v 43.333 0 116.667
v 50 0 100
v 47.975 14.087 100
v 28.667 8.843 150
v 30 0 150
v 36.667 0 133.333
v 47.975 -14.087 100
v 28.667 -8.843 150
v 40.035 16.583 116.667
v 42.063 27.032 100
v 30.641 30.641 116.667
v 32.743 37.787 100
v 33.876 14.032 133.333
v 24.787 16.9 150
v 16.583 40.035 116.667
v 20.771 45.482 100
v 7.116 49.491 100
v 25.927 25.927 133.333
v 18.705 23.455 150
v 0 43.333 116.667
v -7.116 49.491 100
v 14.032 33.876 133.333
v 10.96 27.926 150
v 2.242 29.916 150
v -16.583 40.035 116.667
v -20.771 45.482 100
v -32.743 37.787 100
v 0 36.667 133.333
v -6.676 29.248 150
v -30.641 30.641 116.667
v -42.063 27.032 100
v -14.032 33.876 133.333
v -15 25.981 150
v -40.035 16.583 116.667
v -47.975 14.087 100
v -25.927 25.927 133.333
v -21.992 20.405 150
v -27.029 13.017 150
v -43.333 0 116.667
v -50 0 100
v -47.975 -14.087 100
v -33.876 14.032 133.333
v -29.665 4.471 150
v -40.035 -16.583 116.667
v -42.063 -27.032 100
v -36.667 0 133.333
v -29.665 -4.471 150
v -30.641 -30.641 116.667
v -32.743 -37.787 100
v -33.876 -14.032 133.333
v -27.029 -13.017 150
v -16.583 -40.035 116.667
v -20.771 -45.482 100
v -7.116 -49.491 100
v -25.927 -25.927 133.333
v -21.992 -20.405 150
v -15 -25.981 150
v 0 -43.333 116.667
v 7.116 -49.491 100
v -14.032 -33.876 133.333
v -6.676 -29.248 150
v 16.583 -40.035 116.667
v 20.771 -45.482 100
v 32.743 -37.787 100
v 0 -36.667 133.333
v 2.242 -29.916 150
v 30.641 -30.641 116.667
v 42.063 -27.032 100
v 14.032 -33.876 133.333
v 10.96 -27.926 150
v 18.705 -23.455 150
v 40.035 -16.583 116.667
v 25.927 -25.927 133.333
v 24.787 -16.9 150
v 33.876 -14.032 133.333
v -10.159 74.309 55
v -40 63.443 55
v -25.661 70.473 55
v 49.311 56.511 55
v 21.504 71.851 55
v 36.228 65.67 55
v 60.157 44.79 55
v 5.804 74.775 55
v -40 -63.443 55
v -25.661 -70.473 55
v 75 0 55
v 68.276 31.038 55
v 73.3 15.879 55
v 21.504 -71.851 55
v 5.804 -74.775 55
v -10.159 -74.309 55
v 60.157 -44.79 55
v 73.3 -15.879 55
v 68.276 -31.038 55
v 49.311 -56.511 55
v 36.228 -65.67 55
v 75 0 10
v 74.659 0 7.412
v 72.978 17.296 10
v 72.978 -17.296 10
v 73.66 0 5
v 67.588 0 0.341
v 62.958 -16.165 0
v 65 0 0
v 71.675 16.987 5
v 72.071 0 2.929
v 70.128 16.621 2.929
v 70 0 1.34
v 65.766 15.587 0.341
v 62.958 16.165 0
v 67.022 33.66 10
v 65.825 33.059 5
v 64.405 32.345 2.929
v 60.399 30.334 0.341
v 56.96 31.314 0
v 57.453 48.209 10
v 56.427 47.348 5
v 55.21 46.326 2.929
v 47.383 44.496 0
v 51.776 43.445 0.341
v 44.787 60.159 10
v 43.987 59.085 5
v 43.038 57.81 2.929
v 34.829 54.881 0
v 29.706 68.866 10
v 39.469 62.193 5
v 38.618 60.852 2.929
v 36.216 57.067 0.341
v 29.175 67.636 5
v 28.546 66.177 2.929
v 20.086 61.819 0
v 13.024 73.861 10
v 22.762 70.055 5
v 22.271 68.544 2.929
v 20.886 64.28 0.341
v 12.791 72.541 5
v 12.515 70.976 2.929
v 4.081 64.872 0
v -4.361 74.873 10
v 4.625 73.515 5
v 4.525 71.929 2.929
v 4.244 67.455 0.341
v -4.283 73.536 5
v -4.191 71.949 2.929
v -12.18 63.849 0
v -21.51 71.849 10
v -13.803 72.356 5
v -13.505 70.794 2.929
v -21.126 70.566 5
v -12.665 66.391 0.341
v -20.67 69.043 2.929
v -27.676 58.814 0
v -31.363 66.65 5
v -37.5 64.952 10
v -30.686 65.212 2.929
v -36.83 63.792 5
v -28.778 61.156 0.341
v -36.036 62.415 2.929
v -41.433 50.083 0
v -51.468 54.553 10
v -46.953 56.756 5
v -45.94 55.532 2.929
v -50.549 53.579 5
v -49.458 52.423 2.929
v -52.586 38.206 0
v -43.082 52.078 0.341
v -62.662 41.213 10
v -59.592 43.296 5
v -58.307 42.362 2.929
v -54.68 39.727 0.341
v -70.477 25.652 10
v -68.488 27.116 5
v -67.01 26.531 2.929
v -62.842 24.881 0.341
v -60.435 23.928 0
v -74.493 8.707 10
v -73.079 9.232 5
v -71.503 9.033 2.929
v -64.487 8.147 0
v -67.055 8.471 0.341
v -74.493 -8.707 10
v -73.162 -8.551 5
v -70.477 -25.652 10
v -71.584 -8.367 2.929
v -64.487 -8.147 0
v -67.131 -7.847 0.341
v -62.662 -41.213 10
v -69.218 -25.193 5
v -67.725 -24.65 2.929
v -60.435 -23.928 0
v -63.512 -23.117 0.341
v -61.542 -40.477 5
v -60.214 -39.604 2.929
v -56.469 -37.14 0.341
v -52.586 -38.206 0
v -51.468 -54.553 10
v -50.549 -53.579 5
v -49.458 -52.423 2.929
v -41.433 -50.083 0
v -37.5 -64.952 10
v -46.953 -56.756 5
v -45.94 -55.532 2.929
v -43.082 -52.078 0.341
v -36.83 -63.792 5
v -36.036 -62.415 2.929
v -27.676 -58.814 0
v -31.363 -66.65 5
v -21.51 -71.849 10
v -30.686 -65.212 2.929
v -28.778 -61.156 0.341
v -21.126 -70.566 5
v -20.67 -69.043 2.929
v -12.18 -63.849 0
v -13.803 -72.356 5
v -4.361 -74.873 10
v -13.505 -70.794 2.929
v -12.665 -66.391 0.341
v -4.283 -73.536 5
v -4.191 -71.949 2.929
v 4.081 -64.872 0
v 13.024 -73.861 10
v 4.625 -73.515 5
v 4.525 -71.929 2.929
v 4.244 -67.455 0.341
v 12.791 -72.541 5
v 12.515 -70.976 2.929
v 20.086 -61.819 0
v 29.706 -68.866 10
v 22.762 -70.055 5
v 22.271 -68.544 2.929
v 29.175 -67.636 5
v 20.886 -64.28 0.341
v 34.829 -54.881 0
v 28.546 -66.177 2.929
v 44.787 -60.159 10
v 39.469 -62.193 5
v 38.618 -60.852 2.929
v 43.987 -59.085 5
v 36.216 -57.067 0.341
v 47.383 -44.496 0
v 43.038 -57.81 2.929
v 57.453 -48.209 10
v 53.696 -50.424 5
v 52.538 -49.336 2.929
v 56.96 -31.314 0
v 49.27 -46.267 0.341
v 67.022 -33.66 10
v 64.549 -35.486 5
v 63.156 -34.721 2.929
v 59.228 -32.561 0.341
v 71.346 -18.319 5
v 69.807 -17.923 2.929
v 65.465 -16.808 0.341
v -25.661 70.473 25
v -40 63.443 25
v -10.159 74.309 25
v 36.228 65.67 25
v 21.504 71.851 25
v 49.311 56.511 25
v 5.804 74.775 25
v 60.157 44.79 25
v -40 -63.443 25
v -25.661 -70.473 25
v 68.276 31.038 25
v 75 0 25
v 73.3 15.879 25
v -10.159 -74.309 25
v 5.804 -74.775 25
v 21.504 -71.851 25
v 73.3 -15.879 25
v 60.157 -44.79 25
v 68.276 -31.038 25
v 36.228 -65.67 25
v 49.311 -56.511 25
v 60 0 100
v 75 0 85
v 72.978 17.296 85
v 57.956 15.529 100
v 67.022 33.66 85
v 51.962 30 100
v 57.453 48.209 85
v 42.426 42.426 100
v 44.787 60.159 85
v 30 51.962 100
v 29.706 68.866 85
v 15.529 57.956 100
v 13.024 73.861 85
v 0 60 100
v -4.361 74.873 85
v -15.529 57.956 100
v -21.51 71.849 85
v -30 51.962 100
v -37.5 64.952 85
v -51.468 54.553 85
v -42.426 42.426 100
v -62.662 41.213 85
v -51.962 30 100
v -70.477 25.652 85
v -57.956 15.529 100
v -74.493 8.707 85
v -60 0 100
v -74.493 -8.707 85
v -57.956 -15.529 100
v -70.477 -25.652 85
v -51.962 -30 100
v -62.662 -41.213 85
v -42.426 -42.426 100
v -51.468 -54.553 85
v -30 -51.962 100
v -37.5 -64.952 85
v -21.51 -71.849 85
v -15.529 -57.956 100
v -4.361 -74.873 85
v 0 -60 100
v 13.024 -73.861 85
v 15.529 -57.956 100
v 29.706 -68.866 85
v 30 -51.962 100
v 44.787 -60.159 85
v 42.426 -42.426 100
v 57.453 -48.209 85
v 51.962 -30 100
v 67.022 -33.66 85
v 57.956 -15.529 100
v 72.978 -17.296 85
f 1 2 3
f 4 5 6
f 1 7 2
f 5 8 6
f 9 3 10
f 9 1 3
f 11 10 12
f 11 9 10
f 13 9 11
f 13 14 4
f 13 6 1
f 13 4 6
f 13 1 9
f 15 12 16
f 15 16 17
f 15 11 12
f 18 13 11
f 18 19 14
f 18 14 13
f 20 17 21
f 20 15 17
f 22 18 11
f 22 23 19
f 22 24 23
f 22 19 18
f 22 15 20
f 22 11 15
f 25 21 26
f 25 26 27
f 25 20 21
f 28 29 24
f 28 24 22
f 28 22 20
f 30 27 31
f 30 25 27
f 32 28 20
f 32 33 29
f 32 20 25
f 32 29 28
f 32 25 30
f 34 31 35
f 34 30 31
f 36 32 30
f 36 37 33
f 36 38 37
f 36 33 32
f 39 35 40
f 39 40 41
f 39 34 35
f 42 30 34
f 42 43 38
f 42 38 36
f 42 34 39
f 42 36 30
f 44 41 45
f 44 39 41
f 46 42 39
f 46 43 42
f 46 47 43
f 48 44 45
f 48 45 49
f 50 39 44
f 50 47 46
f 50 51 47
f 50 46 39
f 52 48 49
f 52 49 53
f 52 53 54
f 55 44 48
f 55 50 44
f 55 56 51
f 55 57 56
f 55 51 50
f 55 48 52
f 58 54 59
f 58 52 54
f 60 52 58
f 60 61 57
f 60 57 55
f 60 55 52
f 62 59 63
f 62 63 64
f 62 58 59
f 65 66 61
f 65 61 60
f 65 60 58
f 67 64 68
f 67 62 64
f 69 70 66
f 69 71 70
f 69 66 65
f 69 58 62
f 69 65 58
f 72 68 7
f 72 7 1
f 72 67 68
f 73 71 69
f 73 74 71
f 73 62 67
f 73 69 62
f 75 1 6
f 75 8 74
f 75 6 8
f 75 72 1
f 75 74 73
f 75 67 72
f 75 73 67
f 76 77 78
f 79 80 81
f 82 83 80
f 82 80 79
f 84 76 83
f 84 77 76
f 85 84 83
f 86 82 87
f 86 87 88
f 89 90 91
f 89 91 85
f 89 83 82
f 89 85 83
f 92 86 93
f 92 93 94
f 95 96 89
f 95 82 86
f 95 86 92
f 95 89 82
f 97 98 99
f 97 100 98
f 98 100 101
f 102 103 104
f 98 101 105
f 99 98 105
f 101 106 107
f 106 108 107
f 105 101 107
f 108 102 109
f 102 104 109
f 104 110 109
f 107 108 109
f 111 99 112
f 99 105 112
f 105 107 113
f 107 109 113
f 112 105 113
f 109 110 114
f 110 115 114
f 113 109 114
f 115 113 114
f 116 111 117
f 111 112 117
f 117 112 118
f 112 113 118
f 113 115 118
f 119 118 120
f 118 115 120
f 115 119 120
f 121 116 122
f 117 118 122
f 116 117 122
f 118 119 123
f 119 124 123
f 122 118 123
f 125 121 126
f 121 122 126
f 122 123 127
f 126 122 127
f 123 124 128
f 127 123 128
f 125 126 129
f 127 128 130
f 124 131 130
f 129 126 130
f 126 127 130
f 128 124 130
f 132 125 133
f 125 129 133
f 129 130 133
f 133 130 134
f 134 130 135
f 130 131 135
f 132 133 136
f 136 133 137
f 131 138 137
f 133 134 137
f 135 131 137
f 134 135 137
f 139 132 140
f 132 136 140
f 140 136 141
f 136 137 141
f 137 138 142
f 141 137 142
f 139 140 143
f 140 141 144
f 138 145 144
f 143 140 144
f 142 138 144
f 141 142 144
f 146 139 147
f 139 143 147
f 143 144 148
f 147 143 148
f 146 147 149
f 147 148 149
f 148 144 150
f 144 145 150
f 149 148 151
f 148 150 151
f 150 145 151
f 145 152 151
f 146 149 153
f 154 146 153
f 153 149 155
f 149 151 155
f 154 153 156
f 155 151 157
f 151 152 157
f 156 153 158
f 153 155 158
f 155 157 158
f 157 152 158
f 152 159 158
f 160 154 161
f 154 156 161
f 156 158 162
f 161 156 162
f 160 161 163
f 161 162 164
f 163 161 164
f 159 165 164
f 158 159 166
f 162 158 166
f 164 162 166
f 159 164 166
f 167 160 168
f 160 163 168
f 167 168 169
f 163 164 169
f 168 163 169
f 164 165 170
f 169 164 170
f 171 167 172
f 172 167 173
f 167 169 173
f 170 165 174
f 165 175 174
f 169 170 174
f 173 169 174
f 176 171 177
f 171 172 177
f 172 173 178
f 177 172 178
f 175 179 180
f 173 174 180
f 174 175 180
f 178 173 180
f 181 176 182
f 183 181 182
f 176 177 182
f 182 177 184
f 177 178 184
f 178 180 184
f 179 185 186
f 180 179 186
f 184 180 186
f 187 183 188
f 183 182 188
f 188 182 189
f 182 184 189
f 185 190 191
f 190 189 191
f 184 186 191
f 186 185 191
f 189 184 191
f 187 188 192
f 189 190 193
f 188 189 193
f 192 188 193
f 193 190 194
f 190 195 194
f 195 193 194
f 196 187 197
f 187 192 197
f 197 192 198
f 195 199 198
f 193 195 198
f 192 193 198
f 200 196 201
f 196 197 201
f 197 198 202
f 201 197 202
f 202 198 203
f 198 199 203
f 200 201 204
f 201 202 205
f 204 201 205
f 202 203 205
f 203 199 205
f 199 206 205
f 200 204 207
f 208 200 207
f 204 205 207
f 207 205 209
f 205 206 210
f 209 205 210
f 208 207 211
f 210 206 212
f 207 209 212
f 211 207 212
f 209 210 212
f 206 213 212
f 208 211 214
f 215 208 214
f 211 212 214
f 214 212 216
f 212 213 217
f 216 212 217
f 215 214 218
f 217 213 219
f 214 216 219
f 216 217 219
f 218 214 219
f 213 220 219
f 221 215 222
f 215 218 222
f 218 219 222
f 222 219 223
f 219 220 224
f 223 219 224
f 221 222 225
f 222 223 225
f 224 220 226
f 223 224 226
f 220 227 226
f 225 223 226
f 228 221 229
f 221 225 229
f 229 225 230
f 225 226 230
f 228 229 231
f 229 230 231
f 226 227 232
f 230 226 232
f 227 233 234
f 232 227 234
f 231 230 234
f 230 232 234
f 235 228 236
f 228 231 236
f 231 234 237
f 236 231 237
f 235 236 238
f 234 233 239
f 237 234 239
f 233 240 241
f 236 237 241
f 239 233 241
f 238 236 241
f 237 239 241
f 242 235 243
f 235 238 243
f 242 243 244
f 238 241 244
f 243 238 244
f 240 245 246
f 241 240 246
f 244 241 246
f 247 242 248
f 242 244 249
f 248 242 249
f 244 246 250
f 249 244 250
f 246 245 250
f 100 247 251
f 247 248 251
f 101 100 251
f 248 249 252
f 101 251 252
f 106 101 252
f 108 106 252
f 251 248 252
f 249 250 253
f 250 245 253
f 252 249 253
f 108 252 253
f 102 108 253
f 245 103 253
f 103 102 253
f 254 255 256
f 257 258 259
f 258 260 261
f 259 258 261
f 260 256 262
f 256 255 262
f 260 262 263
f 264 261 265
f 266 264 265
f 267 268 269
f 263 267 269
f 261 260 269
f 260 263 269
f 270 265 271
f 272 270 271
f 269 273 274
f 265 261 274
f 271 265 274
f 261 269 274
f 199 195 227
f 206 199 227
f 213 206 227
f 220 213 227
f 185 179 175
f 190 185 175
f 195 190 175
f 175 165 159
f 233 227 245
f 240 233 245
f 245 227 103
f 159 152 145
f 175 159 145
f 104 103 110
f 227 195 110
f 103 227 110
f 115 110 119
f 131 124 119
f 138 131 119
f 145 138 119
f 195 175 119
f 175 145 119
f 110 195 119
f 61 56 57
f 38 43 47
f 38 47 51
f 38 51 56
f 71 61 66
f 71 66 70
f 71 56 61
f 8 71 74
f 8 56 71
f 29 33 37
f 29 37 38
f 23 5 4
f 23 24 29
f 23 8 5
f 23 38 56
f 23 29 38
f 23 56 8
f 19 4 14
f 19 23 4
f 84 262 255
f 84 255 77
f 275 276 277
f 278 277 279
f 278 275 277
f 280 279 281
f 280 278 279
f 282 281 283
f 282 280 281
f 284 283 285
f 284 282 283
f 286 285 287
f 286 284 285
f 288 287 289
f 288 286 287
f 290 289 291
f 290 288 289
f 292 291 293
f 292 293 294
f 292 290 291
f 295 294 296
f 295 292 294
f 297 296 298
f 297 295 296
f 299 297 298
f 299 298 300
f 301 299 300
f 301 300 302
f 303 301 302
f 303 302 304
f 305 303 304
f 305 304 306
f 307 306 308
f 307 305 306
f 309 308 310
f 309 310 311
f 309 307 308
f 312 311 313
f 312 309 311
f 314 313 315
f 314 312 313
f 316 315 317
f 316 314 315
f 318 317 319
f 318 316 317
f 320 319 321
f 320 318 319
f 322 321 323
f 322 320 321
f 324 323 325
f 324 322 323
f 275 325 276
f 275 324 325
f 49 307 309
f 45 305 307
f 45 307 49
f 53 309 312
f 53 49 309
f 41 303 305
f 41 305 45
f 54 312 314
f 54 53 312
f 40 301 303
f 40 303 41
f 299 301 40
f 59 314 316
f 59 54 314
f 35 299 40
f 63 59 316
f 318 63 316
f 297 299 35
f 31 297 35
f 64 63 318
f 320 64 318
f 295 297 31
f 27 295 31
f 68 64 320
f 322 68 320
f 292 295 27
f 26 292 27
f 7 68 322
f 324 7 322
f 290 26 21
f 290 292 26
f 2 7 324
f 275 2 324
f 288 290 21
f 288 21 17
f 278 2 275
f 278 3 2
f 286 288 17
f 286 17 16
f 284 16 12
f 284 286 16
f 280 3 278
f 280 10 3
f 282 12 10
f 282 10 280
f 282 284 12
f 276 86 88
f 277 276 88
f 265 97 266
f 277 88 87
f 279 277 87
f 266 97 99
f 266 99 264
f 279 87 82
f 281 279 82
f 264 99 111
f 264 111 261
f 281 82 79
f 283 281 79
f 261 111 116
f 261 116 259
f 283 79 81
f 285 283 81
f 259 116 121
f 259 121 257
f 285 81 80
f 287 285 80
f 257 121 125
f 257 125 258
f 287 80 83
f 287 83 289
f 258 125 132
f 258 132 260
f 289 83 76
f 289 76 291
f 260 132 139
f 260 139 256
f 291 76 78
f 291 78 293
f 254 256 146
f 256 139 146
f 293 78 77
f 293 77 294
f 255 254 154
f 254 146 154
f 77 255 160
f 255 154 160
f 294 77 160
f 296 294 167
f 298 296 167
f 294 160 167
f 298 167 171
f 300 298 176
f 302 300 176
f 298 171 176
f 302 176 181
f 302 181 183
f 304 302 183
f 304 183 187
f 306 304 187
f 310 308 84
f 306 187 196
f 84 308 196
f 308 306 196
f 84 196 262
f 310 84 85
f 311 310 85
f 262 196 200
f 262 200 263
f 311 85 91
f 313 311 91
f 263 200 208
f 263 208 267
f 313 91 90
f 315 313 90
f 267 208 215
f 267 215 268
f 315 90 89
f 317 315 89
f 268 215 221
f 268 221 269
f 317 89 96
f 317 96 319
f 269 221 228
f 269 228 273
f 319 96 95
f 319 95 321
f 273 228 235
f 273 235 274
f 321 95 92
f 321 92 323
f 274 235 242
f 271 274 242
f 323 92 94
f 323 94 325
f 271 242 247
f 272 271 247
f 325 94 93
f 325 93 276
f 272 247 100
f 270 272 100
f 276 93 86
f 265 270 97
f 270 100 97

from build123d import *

# Parameters (mm, degrees)
F0_R     = 75
F1_DEPTH = 100
F2_R     = 10
F3_SIZE  = 15
F4_W     = 150
F4_H     = 30
F5_DEPTH = 125


with BuildPart() as f1:
    # F0 (on Top) → F1 (new body)
    with BuildSketch(Plane.XY):
        Circle(F0_R)
    extrude(amount=F1_DEPTH)

    # F2
    f2_edges = [f1.edges().sort_by_distance(p)[0] for p in [
        (-75, 0, 0),
    ]]
    fillet(f2_edges, radius=F2_R)

    # F3
    f3_edges = [f1.edges().sort_by_distance(p)[0] for p in [
        (-75, 0, 100),
    ]]
    chamfer(f3_edges, length=F3_SIZE)

    # F4 (on Front) → F5 (cut, symmetric)
    with BuildSketch(Plane.XZ):
        with Locations((35, 40)):
            Rectangle(F4_W, F4_H)
    extrude(amount=F5_DEPTH, both=True, mode=Mode.SUBTRACT)

    # F6 (on Front) → F7 (revolve)
    with BuildSketch(Plane.XZ):
        Polygon((0, 150), (0, 100), (50, 100), (30, 150), align=None)
    revolve(axis=Axis((0, 0, 125), (0, 0, 1)))


solid = f1.part
